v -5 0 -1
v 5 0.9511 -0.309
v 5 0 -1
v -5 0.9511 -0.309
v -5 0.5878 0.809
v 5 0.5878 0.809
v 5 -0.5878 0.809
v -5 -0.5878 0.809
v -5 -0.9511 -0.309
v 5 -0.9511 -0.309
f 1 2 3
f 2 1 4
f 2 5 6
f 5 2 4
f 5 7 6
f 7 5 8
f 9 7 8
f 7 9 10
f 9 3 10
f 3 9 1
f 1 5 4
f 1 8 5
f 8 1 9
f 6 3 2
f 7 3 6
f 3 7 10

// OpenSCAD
//cartridge heater model

module cartridge_heater(r,h){
    
   
    
    rotate([0,90,0])
    cylinder(r=r, h=h, center = true);
    

    
    }
    
    cartridge_heater(r=1,h=10);
